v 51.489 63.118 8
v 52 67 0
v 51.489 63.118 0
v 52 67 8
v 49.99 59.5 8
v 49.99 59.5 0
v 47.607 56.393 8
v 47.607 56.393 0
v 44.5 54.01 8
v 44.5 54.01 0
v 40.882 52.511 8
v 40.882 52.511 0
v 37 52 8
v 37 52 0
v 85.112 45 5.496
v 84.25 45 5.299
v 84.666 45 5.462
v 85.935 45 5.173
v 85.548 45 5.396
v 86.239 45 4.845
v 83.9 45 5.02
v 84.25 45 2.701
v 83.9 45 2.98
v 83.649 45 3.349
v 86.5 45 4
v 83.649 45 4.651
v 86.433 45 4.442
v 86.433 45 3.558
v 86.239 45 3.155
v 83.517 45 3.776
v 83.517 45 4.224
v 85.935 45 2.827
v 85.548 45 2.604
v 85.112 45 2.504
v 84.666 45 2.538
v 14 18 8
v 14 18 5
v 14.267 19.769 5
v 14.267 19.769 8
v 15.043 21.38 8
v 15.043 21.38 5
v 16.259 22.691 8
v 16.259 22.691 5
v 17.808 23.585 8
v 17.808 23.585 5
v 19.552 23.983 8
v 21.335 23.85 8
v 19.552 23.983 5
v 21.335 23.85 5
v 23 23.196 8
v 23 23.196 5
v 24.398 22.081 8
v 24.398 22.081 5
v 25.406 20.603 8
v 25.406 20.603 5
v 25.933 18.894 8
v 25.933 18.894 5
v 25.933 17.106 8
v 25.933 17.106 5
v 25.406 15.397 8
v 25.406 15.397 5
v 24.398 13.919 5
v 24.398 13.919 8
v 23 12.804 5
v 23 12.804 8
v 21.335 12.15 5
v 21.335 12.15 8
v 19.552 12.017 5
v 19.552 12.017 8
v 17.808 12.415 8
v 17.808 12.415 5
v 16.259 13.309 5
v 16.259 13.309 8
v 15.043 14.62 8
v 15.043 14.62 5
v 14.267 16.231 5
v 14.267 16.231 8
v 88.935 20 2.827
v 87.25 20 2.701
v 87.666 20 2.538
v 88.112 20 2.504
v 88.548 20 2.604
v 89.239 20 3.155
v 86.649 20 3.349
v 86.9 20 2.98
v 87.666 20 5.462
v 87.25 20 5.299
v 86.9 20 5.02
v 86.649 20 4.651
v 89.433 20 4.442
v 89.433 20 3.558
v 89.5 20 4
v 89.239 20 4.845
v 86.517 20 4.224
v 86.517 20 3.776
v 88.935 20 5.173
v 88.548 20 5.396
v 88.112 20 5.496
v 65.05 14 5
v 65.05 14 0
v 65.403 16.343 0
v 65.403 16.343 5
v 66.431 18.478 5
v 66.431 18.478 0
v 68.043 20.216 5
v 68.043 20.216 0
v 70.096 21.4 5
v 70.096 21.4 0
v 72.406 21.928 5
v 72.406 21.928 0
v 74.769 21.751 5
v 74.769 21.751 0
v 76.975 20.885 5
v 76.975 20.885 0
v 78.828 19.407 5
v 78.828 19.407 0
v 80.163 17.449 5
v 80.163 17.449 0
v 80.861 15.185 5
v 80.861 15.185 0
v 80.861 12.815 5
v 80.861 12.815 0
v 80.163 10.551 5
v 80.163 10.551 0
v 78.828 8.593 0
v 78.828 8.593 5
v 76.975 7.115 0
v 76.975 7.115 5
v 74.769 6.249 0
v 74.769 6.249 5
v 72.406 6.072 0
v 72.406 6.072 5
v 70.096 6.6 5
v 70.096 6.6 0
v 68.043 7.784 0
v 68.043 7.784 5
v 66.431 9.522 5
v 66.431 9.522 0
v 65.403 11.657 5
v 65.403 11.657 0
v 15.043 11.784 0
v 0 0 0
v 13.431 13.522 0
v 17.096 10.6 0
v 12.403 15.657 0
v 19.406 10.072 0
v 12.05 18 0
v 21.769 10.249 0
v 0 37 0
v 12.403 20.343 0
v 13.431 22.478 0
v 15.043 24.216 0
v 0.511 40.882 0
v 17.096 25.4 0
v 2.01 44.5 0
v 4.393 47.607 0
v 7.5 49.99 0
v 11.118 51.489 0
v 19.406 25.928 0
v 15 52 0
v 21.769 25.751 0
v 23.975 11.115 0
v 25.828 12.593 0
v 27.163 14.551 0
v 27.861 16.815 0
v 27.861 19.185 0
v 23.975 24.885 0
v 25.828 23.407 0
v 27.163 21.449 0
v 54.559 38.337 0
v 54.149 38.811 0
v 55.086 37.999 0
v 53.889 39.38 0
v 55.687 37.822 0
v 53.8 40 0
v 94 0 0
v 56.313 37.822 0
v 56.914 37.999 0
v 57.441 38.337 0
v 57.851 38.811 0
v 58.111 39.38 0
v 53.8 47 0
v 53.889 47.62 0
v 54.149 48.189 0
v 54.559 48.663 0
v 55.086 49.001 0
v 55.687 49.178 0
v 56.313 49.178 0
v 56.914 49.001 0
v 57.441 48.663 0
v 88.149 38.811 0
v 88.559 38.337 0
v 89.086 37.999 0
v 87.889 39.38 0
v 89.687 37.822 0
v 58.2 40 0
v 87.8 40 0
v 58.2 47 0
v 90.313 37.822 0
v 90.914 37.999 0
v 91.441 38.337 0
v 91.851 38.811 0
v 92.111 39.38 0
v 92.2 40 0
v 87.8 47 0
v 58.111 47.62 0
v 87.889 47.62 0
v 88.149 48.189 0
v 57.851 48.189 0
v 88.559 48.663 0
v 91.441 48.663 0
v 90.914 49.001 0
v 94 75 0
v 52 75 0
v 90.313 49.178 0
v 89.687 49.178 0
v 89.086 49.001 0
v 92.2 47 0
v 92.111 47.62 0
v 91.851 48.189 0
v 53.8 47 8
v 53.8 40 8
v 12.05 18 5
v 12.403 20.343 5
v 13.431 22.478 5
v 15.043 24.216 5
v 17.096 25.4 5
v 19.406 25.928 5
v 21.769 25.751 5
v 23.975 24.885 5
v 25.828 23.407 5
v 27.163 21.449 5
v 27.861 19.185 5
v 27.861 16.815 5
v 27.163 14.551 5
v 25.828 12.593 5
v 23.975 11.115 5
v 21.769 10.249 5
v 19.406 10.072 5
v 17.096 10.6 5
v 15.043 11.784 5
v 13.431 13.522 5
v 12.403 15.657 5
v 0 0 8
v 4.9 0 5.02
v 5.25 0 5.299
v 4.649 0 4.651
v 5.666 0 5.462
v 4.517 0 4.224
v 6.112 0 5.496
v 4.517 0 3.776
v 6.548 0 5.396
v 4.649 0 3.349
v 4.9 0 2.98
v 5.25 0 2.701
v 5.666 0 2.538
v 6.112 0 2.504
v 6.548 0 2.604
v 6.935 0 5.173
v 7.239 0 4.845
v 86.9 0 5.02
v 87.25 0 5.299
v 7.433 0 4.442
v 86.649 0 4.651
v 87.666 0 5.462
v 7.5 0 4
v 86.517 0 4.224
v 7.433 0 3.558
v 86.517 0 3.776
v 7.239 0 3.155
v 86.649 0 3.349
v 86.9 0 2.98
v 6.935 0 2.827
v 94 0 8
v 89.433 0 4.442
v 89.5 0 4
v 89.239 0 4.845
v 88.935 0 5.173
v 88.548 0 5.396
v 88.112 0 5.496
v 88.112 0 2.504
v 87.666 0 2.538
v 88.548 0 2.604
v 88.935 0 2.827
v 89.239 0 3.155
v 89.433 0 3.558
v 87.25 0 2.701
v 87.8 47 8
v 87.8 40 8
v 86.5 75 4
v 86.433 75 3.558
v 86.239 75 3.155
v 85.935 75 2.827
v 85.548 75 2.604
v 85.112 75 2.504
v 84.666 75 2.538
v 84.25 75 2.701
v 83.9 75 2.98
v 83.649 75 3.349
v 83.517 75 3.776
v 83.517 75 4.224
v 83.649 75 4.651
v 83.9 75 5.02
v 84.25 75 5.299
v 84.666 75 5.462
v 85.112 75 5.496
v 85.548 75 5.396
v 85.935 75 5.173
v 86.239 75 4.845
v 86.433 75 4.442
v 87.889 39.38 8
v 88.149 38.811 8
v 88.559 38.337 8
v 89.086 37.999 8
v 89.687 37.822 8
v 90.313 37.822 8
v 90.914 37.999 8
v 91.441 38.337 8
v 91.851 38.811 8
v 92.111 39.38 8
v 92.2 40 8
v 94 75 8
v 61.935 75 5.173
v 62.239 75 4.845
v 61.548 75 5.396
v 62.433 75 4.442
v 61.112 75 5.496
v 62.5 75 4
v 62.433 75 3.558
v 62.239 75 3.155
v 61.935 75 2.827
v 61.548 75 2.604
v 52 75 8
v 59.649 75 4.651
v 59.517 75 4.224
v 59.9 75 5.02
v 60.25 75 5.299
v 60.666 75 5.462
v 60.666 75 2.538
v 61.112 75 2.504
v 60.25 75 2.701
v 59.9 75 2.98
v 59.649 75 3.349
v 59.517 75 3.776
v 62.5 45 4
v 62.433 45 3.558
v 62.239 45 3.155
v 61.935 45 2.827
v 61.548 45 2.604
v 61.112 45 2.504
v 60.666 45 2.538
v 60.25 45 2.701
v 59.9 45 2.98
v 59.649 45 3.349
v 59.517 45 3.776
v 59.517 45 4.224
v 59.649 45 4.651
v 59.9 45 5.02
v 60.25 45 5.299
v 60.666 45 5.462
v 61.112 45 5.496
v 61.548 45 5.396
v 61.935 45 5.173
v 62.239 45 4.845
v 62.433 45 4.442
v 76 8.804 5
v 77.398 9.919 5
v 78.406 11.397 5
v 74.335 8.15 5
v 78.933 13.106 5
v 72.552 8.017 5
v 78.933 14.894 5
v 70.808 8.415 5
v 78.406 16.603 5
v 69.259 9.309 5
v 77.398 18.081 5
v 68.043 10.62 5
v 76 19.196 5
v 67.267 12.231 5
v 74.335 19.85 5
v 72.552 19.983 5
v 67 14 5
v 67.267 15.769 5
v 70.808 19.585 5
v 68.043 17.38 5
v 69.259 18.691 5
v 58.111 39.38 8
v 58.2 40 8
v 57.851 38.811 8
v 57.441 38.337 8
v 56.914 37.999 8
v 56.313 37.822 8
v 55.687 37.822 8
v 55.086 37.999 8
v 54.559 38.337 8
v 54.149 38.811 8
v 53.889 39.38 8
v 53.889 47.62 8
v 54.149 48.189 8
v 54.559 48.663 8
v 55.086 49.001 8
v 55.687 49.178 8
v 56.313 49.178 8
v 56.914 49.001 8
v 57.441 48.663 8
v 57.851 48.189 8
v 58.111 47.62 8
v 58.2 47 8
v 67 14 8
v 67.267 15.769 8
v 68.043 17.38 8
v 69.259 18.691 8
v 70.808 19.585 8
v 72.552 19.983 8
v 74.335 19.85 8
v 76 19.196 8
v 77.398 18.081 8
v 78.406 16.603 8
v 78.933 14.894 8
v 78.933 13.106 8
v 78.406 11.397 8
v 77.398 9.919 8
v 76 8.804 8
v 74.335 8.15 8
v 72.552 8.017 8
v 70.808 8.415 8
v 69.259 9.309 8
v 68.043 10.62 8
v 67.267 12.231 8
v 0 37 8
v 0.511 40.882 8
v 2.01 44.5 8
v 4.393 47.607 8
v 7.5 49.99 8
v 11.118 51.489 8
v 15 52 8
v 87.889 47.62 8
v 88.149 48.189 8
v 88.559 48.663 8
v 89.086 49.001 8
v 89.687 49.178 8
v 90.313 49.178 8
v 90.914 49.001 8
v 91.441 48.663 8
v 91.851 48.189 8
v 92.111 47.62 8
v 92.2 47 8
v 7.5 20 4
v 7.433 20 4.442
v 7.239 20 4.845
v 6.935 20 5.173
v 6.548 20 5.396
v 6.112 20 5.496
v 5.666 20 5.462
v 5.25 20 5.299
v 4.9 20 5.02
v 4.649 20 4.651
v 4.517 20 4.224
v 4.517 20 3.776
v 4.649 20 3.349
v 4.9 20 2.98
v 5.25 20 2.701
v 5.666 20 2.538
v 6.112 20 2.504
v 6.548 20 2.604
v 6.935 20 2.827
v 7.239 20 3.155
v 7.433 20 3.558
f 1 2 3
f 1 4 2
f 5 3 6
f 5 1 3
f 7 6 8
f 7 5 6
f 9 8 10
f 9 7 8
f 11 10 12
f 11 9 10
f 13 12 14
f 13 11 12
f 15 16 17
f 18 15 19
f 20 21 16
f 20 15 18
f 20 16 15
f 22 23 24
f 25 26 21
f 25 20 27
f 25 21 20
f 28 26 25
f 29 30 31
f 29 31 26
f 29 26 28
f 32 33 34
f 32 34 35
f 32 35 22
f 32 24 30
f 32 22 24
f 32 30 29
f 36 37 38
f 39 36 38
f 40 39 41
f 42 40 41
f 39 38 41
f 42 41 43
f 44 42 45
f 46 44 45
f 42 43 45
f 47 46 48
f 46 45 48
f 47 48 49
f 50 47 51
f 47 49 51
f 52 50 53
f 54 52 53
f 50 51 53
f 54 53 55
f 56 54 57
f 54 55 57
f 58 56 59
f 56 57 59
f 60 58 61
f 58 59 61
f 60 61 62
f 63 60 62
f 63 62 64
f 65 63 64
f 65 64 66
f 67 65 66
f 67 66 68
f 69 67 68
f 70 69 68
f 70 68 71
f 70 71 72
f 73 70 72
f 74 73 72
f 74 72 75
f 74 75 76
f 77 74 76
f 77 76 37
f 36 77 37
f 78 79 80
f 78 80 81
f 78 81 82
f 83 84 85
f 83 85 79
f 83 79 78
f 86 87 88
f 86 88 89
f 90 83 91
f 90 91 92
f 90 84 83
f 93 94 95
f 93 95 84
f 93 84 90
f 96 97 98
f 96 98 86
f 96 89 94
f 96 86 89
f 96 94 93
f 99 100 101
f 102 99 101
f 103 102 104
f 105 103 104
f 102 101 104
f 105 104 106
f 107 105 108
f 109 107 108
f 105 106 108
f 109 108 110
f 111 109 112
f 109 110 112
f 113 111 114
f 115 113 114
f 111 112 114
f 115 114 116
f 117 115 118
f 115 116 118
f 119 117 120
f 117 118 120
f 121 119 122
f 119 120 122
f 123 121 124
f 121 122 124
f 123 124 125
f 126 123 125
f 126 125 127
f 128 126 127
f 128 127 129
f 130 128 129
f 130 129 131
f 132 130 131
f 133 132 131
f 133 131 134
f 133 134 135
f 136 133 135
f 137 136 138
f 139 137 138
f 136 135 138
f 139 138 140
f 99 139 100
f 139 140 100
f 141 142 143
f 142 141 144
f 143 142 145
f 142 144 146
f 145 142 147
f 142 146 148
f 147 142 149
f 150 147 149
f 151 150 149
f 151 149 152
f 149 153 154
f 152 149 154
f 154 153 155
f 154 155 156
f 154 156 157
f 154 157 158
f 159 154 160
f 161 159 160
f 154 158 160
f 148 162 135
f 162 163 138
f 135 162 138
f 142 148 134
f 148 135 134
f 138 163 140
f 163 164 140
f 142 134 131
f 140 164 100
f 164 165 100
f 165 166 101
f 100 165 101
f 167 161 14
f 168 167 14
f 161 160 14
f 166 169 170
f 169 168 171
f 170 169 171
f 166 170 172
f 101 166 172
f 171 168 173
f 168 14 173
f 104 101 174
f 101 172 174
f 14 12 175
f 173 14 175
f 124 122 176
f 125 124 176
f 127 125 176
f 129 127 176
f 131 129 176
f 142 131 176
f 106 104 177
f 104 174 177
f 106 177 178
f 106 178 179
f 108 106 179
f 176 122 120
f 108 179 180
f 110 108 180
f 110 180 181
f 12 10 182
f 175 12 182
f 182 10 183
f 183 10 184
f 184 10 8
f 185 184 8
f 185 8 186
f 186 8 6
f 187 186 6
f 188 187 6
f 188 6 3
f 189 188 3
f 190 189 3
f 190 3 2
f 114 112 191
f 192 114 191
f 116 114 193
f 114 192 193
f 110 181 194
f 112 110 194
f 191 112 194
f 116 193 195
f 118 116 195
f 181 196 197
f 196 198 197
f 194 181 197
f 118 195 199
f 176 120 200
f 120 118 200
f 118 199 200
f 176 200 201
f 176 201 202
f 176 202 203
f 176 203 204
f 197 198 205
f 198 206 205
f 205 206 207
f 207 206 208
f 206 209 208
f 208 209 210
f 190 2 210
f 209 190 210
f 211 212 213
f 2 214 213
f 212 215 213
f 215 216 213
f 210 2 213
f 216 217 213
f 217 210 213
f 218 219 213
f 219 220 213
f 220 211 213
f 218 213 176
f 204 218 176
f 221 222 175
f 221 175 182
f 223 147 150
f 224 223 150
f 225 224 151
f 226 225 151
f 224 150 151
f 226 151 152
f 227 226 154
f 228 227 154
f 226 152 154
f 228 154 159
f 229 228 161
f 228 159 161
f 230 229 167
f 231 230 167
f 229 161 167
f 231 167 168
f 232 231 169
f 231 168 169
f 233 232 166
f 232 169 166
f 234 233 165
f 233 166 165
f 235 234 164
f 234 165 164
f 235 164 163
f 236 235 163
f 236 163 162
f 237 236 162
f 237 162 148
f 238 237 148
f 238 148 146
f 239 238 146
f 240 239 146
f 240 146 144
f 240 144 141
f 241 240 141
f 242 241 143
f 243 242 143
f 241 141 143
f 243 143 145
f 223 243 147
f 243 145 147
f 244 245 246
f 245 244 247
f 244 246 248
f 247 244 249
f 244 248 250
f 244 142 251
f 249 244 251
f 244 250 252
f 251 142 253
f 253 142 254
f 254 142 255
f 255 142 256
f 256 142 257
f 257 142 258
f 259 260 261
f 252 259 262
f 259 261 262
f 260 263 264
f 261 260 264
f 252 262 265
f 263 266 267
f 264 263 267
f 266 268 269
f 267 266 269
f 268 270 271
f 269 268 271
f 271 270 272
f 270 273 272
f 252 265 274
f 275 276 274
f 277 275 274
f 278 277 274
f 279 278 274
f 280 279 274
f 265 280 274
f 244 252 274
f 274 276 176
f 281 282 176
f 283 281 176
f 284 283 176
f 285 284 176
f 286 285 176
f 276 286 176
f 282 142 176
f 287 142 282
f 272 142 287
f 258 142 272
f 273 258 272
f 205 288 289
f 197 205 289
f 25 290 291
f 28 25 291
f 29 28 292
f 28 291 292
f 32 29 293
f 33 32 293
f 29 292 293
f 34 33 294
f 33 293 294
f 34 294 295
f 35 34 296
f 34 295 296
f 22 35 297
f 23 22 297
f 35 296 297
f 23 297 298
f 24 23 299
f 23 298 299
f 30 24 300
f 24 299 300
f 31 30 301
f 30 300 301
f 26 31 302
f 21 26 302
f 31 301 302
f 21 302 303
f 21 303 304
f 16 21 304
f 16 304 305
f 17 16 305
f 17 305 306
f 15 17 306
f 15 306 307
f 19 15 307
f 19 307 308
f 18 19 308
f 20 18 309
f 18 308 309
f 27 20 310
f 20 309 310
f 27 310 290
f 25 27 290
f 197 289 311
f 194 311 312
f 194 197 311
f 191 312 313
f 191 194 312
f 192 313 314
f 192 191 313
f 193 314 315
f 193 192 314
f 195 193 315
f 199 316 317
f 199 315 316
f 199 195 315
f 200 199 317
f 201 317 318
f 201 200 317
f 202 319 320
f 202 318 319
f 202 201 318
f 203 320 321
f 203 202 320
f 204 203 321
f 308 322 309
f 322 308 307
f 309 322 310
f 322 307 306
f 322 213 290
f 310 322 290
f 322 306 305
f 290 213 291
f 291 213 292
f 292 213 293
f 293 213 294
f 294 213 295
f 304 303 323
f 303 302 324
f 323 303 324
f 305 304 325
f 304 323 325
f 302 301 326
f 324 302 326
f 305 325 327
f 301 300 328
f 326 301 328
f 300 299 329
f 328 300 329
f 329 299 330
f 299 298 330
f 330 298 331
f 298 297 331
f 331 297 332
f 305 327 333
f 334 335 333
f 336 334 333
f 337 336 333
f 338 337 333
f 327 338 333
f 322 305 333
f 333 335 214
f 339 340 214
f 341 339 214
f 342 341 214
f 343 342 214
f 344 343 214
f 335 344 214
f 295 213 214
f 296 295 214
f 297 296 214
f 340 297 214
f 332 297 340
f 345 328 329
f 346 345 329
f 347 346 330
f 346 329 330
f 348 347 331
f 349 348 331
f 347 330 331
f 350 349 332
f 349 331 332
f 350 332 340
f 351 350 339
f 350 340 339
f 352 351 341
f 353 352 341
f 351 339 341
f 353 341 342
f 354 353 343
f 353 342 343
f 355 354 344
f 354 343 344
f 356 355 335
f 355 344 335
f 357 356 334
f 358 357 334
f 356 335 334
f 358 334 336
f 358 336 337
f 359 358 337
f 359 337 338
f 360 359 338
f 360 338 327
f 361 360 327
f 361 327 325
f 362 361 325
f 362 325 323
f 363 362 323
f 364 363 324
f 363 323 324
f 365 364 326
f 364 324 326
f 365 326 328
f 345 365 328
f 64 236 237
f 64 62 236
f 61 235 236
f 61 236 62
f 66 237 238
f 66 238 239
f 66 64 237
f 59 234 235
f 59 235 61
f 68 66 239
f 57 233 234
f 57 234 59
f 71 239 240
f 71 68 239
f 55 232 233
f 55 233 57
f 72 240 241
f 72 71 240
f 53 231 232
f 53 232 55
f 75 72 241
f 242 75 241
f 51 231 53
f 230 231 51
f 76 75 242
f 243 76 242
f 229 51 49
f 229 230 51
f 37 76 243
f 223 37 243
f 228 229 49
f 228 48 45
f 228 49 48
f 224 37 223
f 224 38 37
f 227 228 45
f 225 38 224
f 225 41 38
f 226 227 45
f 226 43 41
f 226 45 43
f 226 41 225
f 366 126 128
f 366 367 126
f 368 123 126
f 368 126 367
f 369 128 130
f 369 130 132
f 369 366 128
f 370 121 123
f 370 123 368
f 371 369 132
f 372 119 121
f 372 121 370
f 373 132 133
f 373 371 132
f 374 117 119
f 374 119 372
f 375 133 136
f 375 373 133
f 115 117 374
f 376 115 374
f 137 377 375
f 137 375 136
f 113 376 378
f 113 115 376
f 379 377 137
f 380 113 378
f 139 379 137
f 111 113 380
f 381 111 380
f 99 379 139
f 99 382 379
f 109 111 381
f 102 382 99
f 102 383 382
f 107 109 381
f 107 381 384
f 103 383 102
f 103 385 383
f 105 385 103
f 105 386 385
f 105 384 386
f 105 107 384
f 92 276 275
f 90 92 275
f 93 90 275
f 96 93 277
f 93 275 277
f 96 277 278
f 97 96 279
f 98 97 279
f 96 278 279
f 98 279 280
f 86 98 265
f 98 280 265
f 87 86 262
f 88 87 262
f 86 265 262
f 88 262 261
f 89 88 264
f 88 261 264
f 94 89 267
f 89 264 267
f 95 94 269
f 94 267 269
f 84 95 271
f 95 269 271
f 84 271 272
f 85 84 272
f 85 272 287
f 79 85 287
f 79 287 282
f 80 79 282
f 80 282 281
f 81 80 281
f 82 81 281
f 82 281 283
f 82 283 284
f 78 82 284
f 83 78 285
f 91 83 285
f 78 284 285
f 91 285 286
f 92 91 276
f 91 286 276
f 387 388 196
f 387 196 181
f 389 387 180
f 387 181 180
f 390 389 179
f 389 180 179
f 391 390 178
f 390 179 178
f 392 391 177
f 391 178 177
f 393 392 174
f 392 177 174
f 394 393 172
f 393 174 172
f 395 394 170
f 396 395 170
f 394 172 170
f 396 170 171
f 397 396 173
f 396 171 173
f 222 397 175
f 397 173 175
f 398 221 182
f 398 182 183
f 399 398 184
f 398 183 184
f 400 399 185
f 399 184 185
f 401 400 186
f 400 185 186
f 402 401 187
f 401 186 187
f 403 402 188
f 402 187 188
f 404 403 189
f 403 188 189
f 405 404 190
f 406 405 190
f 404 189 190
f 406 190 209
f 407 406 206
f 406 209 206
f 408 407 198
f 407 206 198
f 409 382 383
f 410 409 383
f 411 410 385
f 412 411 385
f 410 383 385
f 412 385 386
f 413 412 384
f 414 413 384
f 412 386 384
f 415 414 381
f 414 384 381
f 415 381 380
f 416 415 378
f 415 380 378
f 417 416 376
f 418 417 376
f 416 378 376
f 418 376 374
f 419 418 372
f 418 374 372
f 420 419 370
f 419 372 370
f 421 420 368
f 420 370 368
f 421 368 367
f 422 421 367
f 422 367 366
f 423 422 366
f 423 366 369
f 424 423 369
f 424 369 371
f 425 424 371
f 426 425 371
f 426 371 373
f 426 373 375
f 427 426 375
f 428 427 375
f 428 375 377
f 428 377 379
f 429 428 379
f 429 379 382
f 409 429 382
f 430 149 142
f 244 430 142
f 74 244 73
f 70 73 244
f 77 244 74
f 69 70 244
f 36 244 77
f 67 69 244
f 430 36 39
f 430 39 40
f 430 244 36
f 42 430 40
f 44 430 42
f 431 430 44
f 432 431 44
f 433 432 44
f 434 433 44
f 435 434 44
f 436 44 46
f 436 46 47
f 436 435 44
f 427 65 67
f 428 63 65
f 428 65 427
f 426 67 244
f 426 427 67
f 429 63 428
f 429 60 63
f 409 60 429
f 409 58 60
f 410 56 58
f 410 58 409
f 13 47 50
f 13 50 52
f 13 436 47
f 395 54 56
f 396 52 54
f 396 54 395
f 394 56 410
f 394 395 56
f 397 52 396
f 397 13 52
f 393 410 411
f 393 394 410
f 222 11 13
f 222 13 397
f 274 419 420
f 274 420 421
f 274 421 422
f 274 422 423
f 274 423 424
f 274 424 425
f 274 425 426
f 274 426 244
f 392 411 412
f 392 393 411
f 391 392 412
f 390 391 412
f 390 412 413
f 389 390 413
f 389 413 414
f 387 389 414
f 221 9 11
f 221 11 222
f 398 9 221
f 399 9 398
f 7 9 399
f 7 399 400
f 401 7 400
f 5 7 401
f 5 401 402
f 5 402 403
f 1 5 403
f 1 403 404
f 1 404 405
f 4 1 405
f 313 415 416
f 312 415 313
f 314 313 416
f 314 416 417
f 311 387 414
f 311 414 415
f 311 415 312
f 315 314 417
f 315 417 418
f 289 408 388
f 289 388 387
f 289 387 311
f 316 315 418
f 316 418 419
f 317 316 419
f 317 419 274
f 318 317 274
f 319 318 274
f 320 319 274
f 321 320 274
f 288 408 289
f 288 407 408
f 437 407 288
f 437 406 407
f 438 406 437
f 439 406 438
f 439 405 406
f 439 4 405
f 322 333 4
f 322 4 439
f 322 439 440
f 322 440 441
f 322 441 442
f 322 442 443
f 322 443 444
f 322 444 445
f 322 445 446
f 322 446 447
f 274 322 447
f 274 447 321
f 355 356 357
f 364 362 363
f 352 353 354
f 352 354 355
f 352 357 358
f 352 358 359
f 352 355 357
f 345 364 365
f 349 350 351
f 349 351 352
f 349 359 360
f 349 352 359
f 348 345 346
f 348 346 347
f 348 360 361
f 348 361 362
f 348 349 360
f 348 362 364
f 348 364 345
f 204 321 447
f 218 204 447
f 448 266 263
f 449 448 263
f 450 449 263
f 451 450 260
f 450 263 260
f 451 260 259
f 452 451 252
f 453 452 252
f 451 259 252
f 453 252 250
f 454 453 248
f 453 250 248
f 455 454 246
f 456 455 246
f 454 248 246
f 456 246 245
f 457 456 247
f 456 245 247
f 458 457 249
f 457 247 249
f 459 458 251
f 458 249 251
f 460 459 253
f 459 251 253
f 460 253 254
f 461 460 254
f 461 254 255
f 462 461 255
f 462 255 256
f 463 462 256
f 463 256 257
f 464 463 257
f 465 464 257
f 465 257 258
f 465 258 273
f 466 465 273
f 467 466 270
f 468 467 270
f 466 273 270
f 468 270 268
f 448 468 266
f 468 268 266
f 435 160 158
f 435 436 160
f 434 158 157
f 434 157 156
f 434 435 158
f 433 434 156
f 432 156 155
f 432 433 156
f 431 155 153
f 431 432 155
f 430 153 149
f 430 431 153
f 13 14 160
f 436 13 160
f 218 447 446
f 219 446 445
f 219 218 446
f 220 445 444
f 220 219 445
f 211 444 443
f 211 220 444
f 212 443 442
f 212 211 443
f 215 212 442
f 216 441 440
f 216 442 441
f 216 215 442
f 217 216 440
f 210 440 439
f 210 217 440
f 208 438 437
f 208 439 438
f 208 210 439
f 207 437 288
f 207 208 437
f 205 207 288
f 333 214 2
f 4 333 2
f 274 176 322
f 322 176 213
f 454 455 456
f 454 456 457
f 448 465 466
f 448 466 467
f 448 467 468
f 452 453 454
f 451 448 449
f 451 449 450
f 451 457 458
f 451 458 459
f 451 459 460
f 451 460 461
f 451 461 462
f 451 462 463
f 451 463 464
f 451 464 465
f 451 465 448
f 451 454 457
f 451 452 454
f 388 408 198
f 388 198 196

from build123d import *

# Parameters (mm, degrees)
BOSS_EXTRU_1_DEPTH      = 8
ESQUISSE2_R             = 7.95
ENL_V_MAT_EXTRU_1_DEPTH = 5
ESQUISSE3_R             = 6
ENL_V_MAT_EXTRU_2_DEPTH = 4
ENL_V_MAT_EXTRU_3_DEPTH = 9
ESQUISSE5_R             = 1.5
ENL_V_MAT_EXTRU_4_DEPTH = 30
CONG_1_R                = 15
ESQUISSE6_R             = 1.5
ENL_V_MAT_EXTRU_5_DEPTH = 20


with BuildPart() as part:
    # Esquisse1 → Boss.-Extru.1 (new body)
    with BuildSketch(Plane.XY):
        Polygon((52, 75), (52, 52), (0, 52), (0, 0), (94, 0), (94, 75), align=None)
    extrude(amount=BOSS_EXTRU_1_DEPTH)

    # Esquisse2 → Enlèv. mat.-Extru.1 (cut)
    with BuildSketch(Plane(origin=(0, 0, 0), x_dir=(-1, 0, 0), z_dir=(0, 0, -1))):
        with Locations((-20, 18)):
            Circle(ESQUISSE2_R)
        with Locations((-73, 14)):
            Circle(ESQUISSE2_R)
    extrude(amount=-ENL_V_MAT_EXTRU_1_DEPTH, mode=Mode.SUBTRACT)

    # Esquisse3 → Enlèv. mat.-Extru.2 (cut, through all)
    with BuildSketch(Plane(origin=(0, 0, 5), x_dir=(-1, 0, 0), z_dir=(0, 0, -1))):
        with Locations((-73, 14)):
            Circle(ESQUISSE3_R)
        with Locations((-20, 18)):
            Circle(ESQUISSE3_R)
    extrude(amount=-ENL_V_MAT_EXTRU_2_DEPTH, mode=Mode.SUBTRACT)

    # Esquisse4 → Enlèv. mat.-Extru.3 (cut, through all)
    with BuildSketch(Plane(origin=(0, 0, 0), x_dir=(-1, 0, 0), z_dir=(0, 0, -1))):
        with BuildLine():
            Line((-92.2, 40), (-92.2, 47))
            ThreePointArc((-92.2, 47), (-90, 49.2), (-87.8, 47))
            Line((-87.8, 47), (-87.8, 40))
            ThreePointArc((-87.8, 40), (-90, 37.8), (-92.2, 40))
        make_face()
        with BuildLine():
            Line((-53.8, 40), (-53.8, 47))
            ThreePointArc((-53.8, 47), (-56, 49.2), (-58.2, 47))
            Line((-58.2, 47), (-58.2, 40))
            ThreePointArc((-58.2, 40), (-56, 37.8), (-53.8, 40))
        make_face()
    extrude(amount=-ENL_V_MAT_EXTRU_3_DEPTH, mode=Mode.SUBTRACT)

    # Esquisse5 → Enlèv. mat.-Extru.4 (cut)
    with BuildSketch(Plane(origin=(0, 75, 0), x_dir=(1, 0, 0), z_dir=(0, 1, 0))):
        with Locations((61, -4)):
            Circle(ESQUISSE5_R)
        with Locations((85, -4)):
            Circle(ESQUISSE5_R)
    extrude(amount=-ENL_V_MAT_EXTRU_4_DEPTH, mode=Mode.SUBTRACT)

    # Congé1
    cong_1_edges = [part.edges().sort_by_distance(p)[0] for p in [
        (0, 52, 4),
        (52, 52, 4),
    ]]
    fillet(cong_1_edges, radius=CONG_1_R)

    # Esquisse6 → Enlèv. mat.-Extru.5 (cut)
    with BuildSketch(Plane.XZ):
        with Locations((6, 4)):
            Circle(ESQUISSE6_R)
        with Locations((88, 4)):
            Circle(ESQUISSE6_R)
    extrude(amount=-ENL_V_MAT_EXTRU_5_DEPTH, mode=Mode.SUBTRACT)


solid = part.part
